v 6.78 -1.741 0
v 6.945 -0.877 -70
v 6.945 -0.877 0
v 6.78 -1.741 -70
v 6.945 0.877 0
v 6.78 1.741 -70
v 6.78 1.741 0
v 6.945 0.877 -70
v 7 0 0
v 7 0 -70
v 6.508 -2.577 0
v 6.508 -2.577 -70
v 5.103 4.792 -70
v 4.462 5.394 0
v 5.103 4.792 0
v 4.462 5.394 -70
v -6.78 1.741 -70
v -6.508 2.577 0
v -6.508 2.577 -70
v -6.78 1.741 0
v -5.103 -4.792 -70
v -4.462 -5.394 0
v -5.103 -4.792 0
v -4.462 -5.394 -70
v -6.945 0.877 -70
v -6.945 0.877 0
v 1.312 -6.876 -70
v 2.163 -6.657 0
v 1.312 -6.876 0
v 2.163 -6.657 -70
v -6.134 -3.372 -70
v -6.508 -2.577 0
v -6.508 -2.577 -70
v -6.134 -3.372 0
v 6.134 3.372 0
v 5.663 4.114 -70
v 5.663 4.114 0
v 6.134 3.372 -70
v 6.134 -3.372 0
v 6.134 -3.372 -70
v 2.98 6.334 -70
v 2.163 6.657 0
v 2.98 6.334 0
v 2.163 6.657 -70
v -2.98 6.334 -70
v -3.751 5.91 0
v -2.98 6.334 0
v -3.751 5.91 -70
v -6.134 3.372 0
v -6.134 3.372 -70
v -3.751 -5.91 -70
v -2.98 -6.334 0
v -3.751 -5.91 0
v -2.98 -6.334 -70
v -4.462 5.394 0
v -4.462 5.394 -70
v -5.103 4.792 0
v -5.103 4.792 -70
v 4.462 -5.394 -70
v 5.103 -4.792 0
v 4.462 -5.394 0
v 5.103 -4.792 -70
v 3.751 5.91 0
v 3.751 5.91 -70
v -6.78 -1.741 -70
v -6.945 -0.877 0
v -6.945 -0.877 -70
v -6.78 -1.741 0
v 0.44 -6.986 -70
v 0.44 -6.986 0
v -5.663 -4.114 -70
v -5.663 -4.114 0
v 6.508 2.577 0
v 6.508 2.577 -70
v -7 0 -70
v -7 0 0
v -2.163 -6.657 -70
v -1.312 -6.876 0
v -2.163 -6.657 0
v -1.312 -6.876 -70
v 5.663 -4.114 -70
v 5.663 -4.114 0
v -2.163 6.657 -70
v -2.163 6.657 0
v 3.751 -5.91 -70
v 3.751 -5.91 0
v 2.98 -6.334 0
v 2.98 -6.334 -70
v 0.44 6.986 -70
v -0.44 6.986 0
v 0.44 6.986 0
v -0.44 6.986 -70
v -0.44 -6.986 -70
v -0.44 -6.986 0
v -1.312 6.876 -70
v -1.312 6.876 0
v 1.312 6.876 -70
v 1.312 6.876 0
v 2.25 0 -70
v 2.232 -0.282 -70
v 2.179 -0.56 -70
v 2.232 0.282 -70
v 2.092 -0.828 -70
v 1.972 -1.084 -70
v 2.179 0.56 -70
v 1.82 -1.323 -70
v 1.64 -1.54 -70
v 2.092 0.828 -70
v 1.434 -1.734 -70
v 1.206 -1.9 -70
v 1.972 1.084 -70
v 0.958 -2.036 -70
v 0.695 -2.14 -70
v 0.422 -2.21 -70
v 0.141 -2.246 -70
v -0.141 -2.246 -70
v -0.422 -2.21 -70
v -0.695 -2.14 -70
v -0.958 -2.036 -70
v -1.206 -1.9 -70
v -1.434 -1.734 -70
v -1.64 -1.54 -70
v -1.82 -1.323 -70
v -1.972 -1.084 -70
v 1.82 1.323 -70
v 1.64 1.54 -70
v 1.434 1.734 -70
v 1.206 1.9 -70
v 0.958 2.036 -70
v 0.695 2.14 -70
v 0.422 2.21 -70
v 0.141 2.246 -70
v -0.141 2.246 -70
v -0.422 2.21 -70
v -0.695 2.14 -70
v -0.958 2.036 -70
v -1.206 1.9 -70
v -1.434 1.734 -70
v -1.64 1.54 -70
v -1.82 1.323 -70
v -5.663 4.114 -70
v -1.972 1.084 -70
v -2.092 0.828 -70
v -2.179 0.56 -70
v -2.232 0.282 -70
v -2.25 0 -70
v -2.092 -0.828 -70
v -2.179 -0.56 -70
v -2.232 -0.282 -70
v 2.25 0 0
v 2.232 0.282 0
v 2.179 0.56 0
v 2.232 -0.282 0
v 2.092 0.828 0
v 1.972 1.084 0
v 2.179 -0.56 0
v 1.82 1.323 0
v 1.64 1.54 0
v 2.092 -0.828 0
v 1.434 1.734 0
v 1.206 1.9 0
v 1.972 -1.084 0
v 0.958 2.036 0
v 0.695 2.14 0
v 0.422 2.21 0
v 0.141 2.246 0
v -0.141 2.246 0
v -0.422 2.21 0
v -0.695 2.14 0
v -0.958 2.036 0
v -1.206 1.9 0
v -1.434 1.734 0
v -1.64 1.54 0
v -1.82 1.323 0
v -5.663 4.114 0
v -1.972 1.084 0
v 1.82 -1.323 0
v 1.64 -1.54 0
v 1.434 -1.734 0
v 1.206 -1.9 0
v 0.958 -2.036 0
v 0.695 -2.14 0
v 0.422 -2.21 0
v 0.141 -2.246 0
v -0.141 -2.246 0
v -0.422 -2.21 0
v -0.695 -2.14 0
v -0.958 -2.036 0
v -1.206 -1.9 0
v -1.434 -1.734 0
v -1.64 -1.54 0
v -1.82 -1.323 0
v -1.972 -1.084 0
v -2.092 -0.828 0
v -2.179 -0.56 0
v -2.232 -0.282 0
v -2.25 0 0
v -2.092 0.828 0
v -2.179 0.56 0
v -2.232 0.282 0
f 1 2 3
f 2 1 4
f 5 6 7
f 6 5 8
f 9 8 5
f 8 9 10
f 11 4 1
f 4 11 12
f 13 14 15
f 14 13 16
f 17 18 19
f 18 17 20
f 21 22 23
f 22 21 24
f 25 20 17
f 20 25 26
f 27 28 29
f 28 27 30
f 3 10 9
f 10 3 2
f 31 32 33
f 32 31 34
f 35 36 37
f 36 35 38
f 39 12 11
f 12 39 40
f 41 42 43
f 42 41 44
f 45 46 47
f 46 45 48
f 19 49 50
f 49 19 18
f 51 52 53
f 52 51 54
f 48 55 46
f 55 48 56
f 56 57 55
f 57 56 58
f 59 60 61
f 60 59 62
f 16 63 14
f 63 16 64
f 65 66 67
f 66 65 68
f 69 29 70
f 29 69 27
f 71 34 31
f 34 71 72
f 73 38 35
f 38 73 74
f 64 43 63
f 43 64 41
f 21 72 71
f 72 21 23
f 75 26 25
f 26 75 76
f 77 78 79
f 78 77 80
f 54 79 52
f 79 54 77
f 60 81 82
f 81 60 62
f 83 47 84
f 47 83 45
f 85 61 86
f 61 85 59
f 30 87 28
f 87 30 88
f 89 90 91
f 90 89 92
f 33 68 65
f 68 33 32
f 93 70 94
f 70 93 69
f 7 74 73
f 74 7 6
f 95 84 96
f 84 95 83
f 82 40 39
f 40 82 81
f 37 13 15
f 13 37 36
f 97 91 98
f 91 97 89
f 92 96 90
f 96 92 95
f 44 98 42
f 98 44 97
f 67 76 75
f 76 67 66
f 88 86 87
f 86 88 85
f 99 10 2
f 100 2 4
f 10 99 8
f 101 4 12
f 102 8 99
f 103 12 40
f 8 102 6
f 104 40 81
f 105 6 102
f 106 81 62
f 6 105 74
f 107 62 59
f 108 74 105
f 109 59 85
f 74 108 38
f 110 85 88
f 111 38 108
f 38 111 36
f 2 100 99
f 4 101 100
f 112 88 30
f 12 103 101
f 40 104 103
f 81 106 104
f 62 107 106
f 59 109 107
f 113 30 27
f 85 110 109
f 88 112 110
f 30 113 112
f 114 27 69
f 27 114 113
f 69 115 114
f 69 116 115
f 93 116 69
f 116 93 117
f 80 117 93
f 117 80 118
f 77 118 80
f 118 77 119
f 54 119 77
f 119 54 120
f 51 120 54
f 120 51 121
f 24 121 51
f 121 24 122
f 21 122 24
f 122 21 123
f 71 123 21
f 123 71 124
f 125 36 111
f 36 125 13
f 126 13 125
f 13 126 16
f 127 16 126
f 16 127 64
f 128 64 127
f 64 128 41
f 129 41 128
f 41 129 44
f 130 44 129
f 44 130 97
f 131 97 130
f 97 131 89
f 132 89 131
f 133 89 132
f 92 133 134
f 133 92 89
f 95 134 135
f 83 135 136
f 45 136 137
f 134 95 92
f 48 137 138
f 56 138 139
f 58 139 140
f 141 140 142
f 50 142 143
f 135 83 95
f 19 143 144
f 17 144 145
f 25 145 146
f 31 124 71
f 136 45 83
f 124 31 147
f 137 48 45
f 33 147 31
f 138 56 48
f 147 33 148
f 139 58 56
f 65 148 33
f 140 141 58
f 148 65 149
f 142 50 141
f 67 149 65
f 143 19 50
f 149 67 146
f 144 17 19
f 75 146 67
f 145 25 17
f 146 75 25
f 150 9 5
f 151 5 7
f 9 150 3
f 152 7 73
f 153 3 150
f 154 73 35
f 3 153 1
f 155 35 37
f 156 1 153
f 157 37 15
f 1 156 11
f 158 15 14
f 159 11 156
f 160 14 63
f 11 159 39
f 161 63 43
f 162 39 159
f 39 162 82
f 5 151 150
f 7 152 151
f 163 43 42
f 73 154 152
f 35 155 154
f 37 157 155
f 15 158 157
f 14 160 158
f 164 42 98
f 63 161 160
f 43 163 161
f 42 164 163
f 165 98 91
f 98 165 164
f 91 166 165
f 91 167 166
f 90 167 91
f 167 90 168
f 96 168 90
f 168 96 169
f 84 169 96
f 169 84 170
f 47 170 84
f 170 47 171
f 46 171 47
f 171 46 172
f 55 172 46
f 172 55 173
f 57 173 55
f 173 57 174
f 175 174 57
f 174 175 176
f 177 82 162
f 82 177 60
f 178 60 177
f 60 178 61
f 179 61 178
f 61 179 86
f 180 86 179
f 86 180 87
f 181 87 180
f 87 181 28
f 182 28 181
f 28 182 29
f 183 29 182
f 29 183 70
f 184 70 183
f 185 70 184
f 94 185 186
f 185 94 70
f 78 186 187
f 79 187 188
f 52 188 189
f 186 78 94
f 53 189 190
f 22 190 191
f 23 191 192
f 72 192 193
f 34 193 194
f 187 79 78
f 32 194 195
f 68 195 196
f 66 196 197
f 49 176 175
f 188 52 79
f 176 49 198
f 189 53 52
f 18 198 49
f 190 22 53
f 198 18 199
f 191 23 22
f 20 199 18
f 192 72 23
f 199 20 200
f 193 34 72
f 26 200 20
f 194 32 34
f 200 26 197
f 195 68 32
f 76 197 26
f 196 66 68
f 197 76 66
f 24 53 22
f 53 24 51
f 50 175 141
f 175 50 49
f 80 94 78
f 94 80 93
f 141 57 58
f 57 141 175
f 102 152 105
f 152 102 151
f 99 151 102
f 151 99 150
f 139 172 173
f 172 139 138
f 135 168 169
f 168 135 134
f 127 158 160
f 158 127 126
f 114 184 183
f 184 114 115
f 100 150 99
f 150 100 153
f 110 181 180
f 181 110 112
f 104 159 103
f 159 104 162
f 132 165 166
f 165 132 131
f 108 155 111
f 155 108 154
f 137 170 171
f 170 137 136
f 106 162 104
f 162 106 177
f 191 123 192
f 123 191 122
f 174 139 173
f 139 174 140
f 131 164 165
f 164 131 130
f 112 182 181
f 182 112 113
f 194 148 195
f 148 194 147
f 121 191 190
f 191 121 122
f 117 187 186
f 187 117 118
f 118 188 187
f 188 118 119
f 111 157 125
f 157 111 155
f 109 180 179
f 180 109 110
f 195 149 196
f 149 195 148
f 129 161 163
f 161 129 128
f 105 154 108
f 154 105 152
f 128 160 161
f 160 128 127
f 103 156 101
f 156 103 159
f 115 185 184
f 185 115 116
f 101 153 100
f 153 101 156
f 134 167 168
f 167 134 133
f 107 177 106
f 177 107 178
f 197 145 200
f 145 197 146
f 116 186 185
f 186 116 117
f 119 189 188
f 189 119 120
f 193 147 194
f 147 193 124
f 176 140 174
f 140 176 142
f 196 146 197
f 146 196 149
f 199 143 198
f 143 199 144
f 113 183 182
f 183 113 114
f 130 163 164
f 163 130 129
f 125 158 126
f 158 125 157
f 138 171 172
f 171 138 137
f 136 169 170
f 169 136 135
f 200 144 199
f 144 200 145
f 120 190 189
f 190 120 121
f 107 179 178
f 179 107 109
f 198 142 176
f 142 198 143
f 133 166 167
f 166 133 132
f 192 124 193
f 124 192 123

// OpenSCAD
$fn = 50;


difference() {
	union() {
		translate(v = [0, 0, -70.0000000000]) {
			cylinder(h = 70, r = 7.0000000000);
		}
		cylinder(h = 0, r = 10.0000000000);
	}
	union() {
		#translate(v = [0, 0, -70]) {
			cylinder(h = 70, r = 2.2500000000);
		}
	}
}
